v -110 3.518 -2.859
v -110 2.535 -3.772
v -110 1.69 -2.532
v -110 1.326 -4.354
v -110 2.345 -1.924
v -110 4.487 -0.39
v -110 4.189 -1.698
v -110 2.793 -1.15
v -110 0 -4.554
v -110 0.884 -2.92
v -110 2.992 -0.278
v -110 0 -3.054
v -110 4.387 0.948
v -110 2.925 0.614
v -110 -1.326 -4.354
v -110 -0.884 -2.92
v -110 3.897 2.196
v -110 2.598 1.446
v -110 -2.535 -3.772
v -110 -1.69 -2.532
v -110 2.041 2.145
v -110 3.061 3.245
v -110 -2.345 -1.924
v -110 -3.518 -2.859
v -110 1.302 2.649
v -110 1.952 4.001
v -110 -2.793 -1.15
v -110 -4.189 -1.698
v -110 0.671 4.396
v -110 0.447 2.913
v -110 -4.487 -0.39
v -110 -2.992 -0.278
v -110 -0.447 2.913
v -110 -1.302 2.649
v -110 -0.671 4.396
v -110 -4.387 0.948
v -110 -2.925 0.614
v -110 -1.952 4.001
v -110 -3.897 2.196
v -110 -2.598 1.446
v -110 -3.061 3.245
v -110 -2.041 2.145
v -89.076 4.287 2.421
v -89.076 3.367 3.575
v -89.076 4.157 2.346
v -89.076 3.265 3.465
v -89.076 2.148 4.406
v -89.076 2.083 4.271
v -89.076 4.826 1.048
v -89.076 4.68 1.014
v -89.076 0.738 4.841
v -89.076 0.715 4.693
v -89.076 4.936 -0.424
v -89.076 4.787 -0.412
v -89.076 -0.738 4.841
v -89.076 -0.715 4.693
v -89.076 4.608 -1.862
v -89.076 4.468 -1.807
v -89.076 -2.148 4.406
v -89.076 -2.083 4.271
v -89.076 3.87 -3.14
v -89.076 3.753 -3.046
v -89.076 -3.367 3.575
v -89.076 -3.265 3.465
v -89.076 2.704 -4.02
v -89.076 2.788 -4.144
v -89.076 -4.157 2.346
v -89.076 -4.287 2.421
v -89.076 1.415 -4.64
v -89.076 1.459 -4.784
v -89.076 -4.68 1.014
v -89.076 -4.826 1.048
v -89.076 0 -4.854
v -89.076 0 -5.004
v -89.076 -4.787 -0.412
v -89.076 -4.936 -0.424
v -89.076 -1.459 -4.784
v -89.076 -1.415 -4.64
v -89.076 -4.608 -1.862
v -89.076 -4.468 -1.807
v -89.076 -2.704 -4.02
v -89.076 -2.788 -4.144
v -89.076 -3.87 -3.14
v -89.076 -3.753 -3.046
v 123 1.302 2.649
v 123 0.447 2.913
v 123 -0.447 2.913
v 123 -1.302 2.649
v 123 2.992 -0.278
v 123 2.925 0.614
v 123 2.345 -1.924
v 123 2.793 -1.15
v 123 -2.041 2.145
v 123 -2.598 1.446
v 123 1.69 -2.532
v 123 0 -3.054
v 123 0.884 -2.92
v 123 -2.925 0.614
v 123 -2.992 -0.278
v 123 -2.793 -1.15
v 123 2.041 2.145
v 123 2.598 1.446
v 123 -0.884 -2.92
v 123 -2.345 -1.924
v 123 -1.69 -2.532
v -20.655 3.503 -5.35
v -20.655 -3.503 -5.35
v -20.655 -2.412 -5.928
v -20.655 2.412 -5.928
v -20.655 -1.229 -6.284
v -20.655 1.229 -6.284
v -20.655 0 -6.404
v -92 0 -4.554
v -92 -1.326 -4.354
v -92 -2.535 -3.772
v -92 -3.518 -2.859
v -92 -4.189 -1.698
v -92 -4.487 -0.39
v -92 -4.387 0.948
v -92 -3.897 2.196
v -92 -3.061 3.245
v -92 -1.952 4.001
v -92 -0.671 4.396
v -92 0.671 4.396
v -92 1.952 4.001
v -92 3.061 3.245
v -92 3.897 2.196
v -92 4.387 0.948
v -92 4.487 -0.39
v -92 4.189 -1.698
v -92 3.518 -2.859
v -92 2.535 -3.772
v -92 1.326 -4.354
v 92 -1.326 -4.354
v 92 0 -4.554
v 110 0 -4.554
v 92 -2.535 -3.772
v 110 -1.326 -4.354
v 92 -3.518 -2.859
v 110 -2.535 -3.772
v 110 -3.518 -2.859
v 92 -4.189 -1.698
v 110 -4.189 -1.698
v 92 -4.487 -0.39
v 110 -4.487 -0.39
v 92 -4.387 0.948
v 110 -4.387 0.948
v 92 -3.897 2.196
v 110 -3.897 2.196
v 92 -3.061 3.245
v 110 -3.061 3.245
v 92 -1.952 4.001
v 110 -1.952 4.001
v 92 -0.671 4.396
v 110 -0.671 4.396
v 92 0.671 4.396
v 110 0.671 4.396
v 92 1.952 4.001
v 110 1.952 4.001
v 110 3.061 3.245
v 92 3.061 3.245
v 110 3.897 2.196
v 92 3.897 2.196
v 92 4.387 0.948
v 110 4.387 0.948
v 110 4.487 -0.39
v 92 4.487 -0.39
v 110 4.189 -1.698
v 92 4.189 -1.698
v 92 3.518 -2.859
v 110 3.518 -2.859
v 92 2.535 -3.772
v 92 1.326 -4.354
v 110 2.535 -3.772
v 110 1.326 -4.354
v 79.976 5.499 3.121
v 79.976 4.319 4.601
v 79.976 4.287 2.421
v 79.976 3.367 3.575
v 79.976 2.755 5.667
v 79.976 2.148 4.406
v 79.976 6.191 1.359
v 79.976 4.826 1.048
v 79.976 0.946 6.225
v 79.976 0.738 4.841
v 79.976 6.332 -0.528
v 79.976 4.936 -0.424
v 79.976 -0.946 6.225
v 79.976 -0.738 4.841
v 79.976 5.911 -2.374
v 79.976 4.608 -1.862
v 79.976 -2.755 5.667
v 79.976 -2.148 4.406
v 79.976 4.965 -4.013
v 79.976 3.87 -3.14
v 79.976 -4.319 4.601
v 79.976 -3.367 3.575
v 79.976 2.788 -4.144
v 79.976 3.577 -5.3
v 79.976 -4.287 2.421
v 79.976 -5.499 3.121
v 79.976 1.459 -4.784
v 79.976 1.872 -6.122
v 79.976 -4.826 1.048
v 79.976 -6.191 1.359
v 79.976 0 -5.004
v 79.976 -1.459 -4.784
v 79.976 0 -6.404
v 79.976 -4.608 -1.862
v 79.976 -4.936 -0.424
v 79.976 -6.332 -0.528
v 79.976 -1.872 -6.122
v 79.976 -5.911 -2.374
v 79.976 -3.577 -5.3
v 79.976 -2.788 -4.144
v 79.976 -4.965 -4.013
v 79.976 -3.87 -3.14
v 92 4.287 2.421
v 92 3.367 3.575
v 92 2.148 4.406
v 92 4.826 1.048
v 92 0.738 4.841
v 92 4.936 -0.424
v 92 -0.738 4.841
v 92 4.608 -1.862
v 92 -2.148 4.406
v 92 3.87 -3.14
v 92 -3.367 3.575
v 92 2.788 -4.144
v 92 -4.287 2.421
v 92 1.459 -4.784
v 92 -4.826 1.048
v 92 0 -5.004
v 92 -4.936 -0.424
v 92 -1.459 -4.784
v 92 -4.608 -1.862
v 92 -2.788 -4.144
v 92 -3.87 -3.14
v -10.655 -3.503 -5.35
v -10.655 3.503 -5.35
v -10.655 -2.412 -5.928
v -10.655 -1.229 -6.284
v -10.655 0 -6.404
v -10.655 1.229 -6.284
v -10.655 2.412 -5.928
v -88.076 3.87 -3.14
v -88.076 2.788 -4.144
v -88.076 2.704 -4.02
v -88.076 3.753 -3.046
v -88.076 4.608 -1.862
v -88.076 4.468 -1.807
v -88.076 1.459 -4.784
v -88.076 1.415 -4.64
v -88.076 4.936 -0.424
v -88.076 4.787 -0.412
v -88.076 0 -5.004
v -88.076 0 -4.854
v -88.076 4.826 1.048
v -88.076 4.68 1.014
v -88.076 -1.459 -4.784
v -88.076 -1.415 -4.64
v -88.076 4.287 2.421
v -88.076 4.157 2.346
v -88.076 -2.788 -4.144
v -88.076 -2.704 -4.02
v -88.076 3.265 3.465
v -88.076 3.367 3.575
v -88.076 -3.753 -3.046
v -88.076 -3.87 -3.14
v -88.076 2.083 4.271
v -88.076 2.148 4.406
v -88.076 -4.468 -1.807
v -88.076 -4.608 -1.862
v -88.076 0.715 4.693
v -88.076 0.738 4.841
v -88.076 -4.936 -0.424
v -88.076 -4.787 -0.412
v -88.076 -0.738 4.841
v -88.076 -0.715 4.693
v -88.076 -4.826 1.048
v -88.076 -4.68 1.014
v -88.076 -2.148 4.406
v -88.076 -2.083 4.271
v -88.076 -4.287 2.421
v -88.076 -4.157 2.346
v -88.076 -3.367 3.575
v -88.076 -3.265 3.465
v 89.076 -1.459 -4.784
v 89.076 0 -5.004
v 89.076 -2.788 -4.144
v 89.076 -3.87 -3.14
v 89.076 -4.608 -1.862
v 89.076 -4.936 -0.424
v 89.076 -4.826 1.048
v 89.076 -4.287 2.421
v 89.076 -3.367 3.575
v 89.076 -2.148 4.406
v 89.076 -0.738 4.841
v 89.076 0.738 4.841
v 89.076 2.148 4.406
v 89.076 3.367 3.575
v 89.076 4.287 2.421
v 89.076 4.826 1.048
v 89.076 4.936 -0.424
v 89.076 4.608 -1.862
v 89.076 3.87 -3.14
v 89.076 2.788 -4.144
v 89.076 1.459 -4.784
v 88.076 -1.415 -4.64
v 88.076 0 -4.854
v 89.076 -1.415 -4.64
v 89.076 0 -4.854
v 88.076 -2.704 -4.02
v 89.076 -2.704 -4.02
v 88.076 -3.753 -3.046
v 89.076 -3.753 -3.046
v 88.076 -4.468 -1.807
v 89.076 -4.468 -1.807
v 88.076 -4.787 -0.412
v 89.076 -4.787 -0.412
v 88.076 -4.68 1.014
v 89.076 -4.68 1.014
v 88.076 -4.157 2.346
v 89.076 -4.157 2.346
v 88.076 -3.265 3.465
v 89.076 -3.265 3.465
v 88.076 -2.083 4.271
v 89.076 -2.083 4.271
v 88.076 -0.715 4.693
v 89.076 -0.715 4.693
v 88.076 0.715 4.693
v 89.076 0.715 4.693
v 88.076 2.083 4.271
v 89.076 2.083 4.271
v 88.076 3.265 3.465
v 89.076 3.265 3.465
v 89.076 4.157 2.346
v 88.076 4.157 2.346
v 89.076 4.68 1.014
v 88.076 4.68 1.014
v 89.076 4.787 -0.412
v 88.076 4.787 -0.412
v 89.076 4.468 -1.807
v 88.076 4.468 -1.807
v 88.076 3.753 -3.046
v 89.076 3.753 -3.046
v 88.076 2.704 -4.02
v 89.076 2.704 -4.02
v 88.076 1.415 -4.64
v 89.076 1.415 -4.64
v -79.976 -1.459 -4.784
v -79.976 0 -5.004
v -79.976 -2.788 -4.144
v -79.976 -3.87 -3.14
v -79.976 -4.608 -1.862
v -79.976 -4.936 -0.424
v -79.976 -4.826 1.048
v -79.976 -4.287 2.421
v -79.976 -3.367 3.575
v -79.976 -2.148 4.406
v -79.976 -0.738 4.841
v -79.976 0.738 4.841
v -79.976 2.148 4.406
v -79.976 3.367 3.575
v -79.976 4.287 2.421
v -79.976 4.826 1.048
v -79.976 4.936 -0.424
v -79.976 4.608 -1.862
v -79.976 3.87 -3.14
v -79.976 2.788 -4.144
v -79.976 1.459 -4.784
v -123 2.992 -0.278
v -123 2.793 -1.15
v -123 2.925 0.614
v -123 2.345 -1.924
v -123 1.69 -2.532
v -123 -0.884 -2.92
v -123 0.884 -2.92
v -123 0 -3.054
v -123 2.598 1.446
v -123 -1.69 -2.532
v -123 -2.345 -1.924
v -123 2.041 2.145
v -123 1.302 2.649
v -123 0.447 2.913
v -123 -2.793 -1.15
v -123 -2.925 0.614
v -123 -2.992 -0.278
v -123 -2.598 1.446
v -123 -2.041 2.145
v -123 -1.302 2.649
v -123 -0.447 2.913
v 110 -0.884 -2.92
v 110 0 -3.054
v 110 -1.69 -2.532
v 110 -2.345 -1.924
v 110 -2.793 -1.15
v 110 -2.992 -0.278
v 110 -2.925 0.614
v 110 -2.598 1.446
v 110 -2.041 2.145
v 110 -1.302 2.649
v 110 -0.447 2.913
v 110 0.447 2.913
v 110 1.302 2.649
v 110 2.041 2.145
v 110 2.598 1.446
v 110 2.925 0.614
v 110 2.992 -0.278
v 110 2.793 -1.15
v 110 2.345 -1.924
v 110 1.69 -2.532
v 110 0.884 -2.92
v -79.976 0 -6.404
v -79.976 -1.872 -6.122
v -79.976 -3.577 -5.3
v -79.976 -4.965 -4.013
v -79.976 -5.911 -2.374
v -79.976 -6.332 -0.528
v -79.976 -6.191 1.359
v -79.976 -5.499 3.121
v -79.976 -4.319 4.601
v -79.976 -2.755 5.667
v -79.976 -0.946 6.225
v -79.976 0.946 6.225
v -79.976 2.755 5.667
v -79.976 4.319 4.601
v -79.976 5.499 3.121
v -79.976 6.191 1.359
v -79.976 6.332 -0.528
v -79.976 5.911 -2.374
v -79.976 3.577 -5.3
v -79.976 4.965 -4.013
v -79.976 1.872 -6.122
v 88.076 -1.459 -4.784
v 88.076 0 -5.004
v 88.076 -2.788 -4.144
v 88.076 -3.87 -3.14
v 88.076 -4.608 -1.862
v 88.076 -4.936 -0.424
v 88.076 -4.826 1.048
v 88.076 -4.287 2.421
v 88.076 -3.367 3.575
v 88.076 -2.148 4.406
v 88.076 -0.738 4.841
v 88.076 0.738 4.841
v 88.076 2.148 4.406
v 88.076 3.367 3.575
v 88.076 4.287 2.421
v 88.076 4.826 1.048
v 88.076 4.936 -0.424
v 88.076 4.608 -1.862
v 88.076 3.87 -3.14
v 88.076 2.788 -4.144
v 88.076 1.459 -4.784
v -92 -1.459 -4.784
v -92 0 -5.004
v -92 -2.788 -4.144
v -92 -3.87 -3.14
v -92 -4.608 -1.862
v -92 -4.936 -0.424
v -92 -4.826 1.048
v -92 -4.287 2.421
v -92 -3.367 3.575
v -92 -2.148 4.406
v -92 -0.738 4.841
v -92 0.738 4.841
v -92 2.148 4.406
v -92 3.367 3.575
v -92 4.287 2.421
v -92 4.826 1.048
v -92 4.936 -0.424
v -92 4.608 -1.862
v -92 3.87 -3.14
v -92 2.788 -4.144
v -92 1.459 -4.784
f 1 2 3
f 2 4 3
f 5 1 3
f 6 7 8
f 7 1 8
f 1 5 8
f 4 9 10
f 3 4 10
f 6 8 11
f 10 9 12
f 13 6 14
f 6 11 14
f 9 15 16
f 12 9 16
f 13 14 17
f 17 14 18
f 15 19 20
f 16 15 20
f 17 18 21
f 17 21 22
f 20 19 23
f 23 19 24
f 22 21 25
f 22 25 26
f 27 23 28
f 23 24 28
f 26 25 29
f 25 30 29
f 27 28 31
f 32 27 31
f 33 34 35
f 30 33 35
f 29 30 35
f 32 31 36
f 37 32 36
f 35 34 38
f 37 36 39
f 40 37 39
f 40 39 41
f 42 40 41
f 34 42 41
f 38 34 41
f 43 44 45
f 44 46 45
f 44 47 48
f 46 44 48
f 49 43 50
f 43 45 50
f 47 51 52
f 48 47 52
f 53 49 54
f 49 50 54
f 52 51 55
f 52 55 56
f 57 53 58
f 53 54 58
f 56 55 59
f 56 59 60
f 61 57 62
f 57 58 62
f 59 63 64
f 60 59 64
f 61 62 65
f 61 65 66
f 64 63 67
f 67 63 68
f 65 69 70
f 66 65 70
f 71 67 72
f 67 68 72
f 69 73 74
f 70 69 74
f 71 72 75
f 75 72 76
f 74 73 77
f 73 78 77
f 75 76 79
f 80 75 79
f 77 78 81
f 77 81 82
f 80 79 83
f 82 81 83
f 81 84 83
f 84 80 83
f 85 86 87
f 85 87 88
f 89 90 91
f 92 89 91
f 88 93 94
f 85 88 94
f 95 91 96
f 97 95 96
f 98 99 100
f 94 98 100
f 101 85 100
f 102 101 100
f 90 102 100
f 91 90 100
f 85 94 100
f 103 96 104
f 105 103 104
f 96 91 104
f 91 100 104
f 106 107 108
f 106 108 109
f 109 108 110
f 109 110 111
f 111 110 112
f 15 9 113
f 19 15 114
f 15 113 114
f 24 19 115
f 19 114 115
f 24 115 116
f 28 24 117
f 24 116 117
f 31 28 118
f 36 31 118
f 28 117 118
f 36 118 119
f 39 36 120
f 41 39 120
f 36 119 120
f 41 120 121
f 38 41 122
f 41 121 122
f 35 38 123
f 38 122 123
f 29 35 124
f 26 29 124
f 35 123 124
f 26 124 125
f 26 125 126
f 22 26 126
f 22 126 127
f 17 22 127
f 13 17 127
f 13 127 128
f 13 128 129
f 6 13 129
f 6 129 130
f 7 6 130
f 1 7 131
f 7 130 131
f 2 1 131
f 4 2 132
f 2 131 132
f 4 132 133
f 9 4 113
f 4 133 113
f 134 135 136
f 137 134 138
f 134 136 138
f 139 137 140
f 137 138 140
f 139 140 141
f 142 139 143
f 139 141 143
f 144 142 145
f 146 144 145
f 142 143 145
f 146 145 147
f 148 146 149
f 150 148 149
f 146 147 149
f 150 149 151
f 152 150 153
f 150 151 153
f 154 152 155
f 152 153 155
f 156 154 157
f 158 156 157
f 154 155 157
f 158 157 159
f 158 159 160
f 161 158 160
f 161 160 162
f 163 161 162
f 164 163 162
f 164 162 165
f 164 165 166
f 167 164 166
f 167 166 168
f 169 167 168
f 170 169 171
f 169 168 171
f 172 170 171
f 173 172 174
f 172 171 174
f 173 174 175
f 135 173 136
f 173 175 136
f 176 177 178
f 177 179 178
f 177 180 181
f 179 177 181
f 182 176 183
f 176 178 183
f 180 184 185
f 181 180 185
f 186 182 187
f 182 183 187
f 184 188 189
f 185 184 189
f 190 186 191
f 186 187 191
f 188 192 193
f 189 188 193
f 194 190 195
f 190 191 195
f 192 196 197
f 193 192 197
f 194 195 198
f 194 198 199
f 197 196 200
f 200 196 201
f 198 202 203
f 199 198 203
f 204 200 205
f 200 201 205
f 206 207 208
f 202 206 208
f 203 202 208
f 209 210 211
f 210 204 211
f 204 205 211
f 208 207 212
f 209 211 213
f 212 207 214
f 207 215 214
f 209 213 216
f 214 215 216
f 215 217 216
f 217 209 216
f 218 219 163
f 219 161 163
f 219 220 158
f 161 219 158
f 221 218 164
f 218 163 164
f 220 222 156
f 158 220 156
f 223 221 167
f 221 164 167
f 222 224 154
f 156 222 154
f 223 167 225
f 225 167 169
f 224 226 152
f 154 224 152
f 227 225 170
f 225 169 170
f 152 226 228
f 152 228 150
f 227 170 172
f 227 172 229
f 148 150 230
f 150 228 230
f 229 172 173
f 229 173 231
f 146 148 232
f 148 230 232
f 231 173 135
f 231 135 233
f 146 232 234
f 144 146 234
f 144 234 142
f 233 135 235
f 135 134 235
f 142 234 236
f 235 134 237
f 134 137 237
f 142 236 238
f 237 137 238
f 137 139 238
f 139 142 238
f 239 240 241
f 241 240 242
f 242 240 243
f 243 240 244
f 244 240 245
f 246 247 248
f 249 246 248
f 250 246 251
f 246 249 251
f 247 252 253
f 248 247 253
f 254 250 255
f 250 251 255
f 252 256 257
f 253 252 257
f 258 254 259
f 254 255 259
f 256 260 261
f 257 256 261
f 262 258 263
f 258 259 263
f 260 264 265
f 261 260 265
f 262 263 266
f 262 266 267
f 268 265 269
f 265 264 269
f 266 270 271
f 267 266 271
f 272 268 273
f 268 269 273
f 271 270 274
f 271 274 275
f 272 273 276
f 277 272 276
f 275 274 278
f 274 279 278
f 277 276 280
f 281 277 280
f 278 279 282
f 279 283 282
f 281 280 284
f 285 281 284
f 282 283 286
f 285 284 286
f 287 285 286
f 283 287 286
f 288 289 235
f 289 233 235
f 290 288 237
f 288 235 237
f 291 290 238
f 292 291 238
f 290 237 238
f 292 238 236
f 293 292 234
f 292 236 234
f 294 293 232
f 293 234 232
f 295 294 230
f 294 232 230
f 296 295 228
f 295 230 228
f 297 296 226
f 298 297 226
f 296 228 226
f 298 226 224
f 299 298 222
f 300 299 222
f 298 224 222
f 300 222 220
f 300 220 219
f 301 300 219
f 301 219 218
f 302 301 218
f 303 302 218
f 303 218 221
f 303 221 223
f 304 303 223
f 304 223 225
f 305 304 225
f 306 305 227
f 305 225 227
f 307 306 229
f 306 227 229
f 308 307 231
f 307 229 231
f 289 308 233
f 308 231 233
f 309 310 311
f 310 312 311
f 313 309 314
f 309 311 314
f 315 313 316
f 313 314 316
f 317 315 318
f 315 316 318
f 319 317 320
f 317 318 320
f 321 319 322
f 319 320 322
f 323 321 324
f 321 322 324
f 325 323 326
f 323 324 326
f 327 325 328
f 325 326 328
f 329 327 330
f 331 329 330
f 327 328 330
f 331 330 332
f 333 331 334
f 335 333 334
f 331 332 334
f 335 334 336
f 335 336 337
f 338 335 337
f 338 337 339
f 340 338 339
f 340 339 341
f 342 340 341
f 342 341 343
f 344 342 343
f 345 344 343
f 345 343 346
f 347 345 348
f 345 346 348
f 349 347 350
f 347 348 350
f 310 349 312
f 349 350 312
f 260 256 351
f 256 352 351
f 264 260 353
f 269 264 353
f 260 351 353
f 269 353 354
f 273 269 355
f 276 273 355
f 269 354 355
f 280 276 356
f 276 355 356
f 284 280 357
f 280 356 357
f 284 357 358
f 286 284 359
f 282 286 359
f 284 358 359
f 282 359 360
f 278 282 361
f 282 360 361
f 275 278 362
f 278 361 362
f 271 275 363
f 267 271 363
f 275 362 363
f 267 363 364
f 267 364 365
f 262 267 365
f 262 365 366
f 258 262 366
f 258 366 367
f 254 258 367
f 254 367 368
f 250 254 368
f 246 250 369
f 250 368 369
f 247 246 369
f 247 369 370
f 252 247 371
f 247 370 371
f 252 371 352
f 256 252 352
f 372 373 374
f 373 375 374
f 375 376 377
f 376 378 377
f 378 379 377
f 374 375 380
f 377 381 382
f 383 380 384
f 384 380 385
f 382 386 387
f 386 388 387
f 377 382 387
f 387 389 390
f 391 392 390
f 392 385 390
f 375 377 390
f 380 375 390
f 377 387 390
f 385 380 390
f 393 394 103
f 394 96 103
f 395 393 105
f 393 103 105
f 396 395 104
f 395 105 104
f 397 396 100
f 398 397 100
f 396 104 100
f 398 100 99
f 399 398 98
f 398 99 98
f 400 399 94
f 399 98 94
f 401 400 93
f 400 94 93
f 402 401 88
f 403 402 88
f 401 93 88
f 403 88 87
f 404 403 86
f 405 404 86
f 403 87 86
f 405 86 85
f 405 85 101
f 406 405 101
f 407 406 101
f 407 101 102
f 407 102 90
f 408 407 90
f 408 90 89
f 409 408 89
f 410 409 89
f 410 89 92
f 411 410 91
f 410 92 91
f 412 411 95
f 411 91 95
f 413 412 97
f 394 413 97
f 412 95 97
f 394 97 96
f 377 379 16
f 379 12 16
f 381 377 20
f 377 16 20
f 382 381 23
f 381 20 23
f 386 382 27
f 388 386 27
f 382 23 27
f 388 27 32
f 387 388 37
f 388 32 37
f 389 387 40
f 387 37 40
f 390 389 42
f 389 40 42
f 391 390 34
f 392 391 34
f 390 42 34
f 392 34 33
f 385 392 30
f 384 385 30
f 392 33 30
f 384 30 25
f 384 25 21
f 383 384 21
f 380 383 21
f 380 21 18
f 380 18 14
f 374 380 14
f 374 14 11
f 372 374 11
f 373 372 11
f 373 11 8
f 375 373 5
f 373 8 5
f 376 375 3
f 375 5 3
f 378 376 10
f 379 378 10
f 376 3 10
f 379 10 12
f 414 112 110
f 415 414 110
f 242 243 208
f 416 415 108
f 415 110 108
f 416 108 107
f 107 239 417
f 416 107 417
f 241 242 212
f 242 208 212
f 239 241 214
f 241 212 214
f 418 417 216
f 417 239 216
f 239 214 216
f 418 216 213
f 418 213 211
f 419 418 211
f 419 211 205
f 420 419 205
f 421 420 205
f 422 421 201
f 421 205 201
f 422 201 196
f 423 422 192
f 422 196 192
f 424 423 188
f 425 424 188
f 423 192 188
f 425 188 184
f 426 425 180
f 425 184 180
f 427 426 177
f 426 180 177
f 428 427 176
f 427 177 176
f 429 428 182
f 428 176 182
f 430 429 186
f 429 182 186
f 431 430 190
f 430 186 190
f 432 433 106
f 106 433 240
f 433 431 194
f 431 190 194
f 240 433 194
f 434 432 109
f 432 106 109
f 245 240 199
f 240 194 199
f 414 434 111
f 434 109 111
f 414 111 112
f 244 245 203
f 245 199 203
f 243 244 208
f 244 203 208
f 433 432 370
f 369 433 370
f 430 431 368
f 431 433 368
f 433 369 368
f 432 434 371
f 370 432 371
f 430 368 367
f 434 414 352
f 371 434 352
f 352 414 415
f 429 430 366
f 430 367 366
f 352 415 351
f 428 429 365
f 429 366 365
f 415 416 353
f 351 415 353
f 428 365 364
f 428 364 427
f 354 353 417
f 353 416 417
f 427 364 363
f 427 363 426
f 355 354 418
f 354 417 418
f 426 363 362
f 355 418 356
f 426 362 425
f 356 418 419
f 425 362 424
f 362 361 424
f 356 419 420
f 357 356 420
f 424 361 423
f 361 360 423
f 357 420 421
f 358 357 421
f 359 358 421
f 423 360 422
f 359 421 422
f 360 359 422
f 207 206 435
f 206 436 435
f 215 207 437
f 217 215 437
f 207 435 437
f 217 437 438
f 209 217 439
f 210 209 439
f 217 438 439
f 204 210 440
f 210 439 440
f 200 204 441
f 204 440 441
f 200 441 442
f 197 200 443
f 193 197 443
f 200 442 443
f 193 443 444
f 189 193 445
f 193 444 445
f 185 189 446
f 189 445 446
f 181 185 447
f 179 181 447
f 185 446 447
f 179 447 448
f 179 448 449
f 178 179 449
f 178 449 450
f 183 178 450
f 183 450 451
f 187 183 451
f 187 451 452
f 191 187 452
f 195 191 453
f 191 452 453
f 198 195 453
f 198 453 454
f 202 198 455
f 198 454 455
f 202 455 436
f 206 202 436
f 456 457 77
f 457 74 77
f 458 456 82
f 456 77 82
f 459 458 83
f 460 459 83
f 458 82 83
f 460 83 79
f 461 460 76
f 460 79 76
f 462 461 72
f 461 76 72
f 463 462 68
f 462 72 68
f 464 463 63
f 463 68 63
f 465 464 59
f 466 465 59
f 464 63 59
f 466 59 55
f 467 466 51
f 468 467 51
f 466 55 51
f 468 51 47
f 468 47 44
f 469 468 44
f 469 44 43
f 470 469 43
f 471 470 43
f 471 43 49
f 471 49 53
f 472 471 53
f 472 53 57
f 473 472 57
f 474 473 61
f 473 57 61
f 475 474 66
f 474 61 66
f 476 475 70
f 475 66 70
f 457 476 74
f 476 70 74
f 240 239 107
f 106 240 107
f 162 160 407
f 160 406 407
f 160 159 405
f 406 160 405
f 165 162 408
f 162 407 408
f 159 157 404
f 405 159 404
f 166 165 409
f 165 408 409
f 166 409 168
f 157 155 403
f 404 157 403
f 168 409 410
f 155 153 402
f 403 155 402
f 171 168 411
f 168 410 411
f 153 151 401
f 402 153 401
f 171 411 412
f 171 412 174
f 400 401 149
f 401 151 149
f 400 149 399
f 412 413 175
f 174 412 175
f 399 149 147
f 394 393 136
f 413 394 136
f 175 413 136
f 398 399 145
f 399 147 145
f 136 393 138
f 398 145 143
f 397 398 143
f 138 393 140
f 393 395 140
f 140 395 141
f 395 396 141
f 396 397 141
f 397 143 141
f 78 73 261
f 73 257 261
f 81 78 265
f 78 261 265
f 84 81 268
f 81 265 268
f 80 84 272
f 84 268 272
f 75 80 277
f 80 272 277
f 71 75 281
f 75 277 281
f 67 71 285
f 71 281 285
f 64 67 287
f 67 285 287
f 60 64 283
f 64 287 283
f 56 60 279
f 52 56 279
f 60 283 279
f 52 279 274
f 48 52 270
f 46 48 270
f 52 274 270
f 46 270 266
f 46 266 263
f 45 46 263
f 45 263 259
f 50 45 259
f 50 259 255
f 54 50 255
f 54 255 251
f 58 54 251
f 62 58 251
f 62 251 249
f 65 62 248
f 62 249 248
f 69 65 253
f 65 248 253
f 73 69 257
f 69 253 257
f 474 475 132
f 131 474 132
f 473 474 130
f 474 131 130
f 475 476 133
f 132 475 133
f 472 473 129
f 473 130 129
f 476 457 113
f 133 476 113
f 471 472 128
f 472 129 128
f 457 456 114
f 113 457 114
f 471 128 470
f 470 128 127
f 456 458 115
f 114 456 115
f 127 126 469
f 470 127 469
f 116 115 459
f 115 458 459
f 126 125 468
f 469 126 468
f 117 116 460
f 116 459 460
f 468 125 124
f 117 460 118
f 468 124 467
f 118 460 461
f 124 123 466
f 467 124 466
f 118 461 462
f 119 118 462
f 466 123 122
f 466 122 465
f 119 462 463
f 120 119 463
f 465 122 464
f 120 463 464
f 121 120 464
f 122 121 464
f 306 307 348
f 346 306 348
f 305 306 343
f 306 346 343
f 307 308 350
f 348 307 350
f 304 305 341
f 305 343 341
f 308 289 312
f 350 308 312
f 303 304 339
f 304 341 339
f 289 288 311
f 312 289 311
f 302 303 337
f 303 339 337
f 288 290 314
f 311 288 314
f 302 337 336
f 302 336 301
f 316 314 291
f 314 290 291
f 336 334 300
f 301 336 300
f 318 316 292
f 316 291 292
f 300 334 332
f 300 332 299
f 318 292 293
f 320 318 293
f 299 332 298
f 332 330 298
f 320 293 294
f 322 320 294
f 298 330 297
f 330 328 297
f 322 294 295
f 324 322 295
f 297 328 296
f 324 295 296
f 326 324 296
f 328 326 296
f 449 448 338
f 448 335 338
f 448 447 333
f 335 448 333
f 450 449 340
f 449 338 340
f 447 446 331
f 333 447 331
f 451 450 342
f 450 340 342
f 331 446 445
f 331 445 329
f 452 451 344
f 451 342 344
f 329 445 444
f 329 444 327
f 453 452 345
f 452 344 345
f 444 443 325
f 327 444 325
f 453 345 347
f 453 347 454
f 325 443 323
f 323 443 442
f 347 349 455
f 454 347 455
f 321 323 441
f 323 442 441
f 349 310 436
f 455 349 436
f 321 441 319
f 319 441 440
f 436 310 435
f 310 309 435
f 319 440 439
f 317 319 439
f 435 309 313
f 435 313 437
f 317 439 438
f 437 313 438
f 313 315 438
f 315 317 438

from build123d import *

# Parameters (mm, degrees)
CUT_EXTRUDE1_DEPTH      = 124.33016533
CUT_EXTRUDE1_DEPTH_BACK = 124.33016533


with BuildPart() as part:
    # Sketch1 → Revolve1 (revolve)
    with BuildSketch(Plane(origin=(0, 0, 0), x_dir=(1, 0, 0), z_dir=(0, 1, 0))):
        Polygon((123, 0.053684898), (-123, 0.053684898), (-123, 3.053684898), (-110, 3.053684898), (-110, 4.553684898), (-92, 4.553684898), (-92, 5.003684898), (-89.076146667, 5.003684898), (-89.076146667, 4.853684898), (-88.076146667, 4.853684898), (-88.076146667, 5.003684898), (-79.976146667, 5.003684898), (-79.976146667, 6.403684898), (79.976146667, 6.403684898), (79.976146667, 5.003684898), (88.076146667, 5.003684898), (88.076146667, 4.853684898), (89.076146667, 4.853684898), (89.076146667, 5.003684898), (92, 5.003684898), (92, 4.553684898), (110, 4.553684898), (110, 3.053684898), (123, 3.053684898), align=None)
    revolve(axis=Axis((123, 0, -0.053684898), (-1, 0, 0)))

    # Sketch5 → Cut-Extrude1 (cut, two sides: drawn at the far end of the back side and taken through both)
    with BuildSketch(Plane(origin=(0, 0, 0), x_dir=(1, 0, 0), z_dir=(0, 1, 0)).offset(-CUT_EXTRUDE1_DEPTH_BACK)):
        Polygon((-10.654863746, 304.833987592), (-10.654863746, 6.403684898), (-10.654863746, 5.35), (-20.654863746, 5.35), (-20.654863746, 6.403684898), (-20.654863746, 304.833987592), (-20.654863746, 901.69459298), (-10.654863746, 901.69459298), align=None)
    extrude(amount=CUT_EXTRUDE1_DEPTH + CUT_EXTRUDE1_DEPTH_BACK, mode=Mode.SUBTRACT)


solid = part.part
